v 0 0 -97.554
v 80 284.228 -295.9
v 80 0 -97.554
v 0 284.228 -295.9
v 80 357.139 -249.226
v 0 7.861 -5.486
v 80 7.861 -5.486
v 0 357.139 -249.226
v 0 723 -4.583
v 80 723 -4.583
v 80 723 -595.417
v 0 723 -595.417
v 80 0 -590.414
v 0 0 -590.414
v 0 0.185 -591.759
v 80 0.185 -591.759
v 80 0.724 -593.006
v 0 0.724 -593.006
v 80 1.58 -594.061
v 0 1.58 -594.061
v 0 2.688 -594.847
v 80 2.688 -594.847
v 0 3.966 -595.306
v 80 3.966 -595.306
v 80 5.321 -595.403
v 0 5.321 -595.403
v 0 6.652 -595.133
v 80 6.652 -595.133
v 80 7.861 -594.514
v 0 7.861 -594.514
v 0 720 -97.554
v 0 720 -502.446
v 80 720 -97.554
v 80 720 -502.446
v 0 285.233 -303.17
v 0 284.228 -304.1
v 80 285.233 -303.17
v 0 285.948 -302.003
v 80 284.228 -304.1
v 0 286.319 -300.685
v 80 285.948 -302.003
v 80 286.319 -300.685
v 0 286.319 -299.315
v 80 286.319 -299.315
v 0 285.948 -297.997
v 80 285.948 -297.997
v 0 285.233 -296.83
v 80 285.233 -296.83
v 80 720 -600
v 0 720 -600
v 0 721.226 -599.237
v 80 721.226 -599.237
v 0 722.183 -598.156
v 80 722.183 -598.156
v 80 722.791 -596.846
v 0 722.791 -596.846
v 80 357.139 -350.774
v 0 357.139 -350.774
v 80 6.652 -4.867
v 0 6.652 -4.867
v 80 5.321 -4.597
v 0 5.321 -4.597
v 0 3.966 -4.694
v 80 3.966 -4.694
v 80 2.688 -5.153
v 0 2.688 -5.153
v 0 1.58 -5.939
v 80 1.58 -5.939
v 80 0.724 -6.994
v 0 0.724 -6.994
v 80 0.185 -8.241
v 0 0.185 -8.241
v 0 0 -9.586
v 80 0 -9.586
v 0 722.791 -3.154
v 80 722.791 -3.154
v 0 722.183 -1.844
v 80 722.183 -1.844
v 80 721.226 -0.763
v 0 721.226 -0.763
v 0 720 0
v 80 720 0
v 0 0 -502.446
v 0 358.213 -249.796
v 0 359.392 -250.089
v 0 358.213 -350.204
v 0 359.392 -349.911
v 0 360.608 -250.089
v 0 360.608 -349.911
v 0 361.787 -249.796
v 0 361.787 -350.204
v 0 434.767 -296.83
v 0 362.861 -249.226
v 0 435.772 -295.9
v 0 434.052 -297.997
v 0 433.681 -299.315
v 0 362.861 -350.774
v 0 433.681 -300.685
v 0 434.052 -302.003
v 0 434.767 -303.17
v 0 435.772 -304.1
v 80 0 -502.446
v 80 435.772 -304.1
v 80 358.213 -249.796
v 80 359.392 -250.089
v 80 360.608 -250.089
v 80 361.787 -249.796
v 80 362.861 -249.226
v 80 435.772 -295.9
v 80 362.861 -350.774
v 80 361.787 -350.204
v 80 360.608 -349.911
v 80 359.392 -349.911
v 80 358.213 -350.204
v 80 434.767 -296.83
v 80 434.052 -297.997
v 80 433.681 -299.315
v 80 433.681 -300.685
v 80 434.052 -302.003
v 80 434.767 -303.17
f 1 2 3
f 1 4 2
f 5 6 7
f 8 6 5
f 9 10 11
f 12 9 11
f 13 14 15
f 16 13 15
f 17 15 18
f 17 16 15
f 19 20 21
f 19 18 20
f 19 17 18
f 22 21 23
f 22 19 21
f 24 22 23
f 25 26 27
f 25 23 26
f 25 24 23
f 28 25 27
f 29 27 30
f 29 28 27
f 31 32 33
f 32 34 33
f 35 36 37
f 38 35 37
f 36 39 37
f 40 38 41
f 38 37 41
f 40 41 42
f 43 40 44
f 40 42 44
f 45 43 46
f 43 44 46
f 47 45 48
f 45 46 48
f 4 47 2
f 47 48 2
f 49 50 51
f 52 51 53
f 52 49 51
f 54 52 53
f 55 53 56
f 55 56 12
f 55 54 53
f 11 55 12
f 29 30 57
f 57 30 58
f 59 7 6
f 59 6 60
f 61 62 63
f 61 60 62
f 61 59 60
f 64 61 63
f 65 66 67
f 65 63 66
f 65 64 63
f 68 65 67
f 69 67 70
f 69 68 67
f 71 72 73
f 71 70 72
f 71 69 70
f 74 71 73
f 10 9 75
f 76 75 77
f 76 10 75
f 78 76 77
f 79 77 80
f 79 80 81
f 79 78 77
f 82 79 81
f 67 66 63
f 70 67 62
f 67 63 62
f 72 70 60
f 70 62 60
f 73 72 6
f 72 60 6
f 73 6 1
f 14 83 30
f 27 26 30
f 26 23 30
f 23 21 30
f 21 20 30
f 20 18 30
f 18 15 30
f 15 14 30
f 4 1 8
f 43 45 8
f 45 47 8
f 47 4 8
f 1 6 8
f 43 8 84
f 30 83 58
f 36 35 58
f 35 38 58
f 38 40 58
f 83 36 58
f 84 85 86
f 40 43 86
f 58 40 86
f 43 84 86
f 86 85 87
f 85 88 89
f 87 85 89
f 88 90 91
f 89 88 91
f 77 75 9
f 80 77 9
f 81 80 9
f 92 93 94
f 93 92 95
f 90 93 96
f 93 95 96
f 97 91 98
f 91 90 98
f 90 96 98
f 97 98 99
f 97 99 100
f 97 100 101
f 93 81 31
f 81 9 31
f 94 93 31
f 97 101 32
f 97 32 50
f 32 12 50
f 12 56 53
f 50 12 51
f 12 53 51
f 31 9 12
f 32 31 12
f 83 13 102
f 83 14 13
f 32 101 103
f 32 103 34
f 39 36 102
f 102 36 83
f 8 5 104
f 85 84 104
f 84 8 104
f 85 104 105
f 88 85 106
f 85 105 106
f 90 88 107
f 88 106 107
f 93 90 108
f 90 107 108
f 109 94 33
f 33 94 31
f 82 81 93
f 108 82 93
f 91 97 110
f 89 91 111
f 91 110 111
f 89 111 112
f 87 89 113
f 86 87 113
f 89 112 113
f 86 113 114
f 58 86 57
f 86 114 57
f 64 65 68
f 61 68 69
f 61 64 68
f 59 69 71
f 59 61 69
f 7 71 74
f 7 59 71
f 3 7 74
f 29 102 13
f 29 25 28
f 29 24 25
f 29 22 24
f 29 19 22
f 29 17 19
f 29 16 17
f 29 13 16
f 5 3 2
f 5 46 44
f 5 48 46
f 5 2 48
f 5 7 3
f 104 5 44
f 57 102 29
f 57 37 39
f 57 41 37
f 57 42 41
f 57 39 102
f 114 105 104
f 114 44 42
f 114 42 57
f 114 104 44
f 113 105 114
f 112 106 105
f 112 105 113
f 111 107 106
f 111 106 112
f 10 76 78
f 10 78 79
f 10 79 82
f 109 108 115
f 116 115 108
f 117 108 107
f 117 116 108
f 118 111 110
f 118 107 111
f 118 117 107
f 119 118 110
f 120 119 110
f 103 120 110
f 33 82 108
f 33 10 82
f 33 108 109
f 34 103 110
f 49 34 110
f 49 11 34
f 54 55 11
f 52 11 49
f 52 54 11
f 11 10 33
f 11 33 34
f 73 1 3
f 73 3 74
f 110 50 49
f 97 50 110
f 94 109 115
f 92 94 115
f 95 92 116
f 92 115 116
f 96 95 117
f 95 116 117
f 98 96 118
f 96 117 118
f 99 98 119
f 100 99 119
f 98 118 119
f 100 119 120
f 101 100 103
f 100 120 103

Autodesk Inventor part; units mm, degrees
ref_plane "YZ Plane" through (0, 0, 0) normal (1, 0, 0) x (0, 1, 0)
ref_plane "XZ Plane" through (0, 0, 0) normal (0, 1, 0) x (-1, 0, 0)
ref_plane "XY Plane" through (0, 0, 0) normal (0, 0, 1) x (1, 0, 0)
sketch "Sketch1" plane through (0, 0, 0) normal (1, 0, 0) x (0, 1, 0)
  line L0 (720, 0) -> (0, -502.4464)
  line L1 (0, -600) -> (720, -97.5536)
  line L2 (0, 0) -> (720, -502.4464)
  line L3 (720, -600) -> (0, -97.5536)
  line L4 (720, 0) -> (720, -97.5536)
  line L5 (720, -502.4464) -> (720, -600)
  line L6 (0, -600) -> (0, -502.4464)
  line L7 (0, -97.5536) -> (0, 0)
  dimension "d0" = 600
  dimension "d1" = 720
  dimension "d2" = 80
  dimension "d3" = 80
sketch "Sketch2" plane through (0, 0, 0) normal (1, 0, 0) x (0, 1, 0)
  point P0 (0, 0)
extrude "Extrusion1" add sketch "Sketch1" along normal blind 80
fillet "Fillet1" radius 5 1 edges at (40, 360, -251.2232)
fillet "Fillet2" radius 5 1 edges at (40, 429.8966, -300)
fillet "Fillet3" radius 5 1 edges at (40, 360, -348.7768)
fillet "Fillet4" radius 5 1 edges at (40, 290.1034, -300)
sketch "Sketch3" plane through (80, 0, 0) normal (1, 0, 0) x (0, 0, -1)
  line L0 (502.4464, 720) -> (600, 720) projected
  line L1 (0, 723) -> (600, 723)
  line L2 (600, 723) -> (600, 720)
  line L3 (600, 720) -> (0, 720)
  line L4 (0, 720) -> (0, 723)
  point P0 (0, 0)
  dimension "d10" = 600
  dimension "d11" = 3
extrude "Extrusion2" add sketch "Sketch3" against normal blind 80
fillet "Fillet5" radius 5 1 edges at (40, 0, 0)
fillet "Fillet6" radius 5 1 edges at (40, 723, 0)
fillet "Fillet7" radius 5 1 edges at (40, 723, -600)
fillet "Fillet8" radius 5 1 edges at (40, 0, -600)
properties part number "leg" material "Steel"
